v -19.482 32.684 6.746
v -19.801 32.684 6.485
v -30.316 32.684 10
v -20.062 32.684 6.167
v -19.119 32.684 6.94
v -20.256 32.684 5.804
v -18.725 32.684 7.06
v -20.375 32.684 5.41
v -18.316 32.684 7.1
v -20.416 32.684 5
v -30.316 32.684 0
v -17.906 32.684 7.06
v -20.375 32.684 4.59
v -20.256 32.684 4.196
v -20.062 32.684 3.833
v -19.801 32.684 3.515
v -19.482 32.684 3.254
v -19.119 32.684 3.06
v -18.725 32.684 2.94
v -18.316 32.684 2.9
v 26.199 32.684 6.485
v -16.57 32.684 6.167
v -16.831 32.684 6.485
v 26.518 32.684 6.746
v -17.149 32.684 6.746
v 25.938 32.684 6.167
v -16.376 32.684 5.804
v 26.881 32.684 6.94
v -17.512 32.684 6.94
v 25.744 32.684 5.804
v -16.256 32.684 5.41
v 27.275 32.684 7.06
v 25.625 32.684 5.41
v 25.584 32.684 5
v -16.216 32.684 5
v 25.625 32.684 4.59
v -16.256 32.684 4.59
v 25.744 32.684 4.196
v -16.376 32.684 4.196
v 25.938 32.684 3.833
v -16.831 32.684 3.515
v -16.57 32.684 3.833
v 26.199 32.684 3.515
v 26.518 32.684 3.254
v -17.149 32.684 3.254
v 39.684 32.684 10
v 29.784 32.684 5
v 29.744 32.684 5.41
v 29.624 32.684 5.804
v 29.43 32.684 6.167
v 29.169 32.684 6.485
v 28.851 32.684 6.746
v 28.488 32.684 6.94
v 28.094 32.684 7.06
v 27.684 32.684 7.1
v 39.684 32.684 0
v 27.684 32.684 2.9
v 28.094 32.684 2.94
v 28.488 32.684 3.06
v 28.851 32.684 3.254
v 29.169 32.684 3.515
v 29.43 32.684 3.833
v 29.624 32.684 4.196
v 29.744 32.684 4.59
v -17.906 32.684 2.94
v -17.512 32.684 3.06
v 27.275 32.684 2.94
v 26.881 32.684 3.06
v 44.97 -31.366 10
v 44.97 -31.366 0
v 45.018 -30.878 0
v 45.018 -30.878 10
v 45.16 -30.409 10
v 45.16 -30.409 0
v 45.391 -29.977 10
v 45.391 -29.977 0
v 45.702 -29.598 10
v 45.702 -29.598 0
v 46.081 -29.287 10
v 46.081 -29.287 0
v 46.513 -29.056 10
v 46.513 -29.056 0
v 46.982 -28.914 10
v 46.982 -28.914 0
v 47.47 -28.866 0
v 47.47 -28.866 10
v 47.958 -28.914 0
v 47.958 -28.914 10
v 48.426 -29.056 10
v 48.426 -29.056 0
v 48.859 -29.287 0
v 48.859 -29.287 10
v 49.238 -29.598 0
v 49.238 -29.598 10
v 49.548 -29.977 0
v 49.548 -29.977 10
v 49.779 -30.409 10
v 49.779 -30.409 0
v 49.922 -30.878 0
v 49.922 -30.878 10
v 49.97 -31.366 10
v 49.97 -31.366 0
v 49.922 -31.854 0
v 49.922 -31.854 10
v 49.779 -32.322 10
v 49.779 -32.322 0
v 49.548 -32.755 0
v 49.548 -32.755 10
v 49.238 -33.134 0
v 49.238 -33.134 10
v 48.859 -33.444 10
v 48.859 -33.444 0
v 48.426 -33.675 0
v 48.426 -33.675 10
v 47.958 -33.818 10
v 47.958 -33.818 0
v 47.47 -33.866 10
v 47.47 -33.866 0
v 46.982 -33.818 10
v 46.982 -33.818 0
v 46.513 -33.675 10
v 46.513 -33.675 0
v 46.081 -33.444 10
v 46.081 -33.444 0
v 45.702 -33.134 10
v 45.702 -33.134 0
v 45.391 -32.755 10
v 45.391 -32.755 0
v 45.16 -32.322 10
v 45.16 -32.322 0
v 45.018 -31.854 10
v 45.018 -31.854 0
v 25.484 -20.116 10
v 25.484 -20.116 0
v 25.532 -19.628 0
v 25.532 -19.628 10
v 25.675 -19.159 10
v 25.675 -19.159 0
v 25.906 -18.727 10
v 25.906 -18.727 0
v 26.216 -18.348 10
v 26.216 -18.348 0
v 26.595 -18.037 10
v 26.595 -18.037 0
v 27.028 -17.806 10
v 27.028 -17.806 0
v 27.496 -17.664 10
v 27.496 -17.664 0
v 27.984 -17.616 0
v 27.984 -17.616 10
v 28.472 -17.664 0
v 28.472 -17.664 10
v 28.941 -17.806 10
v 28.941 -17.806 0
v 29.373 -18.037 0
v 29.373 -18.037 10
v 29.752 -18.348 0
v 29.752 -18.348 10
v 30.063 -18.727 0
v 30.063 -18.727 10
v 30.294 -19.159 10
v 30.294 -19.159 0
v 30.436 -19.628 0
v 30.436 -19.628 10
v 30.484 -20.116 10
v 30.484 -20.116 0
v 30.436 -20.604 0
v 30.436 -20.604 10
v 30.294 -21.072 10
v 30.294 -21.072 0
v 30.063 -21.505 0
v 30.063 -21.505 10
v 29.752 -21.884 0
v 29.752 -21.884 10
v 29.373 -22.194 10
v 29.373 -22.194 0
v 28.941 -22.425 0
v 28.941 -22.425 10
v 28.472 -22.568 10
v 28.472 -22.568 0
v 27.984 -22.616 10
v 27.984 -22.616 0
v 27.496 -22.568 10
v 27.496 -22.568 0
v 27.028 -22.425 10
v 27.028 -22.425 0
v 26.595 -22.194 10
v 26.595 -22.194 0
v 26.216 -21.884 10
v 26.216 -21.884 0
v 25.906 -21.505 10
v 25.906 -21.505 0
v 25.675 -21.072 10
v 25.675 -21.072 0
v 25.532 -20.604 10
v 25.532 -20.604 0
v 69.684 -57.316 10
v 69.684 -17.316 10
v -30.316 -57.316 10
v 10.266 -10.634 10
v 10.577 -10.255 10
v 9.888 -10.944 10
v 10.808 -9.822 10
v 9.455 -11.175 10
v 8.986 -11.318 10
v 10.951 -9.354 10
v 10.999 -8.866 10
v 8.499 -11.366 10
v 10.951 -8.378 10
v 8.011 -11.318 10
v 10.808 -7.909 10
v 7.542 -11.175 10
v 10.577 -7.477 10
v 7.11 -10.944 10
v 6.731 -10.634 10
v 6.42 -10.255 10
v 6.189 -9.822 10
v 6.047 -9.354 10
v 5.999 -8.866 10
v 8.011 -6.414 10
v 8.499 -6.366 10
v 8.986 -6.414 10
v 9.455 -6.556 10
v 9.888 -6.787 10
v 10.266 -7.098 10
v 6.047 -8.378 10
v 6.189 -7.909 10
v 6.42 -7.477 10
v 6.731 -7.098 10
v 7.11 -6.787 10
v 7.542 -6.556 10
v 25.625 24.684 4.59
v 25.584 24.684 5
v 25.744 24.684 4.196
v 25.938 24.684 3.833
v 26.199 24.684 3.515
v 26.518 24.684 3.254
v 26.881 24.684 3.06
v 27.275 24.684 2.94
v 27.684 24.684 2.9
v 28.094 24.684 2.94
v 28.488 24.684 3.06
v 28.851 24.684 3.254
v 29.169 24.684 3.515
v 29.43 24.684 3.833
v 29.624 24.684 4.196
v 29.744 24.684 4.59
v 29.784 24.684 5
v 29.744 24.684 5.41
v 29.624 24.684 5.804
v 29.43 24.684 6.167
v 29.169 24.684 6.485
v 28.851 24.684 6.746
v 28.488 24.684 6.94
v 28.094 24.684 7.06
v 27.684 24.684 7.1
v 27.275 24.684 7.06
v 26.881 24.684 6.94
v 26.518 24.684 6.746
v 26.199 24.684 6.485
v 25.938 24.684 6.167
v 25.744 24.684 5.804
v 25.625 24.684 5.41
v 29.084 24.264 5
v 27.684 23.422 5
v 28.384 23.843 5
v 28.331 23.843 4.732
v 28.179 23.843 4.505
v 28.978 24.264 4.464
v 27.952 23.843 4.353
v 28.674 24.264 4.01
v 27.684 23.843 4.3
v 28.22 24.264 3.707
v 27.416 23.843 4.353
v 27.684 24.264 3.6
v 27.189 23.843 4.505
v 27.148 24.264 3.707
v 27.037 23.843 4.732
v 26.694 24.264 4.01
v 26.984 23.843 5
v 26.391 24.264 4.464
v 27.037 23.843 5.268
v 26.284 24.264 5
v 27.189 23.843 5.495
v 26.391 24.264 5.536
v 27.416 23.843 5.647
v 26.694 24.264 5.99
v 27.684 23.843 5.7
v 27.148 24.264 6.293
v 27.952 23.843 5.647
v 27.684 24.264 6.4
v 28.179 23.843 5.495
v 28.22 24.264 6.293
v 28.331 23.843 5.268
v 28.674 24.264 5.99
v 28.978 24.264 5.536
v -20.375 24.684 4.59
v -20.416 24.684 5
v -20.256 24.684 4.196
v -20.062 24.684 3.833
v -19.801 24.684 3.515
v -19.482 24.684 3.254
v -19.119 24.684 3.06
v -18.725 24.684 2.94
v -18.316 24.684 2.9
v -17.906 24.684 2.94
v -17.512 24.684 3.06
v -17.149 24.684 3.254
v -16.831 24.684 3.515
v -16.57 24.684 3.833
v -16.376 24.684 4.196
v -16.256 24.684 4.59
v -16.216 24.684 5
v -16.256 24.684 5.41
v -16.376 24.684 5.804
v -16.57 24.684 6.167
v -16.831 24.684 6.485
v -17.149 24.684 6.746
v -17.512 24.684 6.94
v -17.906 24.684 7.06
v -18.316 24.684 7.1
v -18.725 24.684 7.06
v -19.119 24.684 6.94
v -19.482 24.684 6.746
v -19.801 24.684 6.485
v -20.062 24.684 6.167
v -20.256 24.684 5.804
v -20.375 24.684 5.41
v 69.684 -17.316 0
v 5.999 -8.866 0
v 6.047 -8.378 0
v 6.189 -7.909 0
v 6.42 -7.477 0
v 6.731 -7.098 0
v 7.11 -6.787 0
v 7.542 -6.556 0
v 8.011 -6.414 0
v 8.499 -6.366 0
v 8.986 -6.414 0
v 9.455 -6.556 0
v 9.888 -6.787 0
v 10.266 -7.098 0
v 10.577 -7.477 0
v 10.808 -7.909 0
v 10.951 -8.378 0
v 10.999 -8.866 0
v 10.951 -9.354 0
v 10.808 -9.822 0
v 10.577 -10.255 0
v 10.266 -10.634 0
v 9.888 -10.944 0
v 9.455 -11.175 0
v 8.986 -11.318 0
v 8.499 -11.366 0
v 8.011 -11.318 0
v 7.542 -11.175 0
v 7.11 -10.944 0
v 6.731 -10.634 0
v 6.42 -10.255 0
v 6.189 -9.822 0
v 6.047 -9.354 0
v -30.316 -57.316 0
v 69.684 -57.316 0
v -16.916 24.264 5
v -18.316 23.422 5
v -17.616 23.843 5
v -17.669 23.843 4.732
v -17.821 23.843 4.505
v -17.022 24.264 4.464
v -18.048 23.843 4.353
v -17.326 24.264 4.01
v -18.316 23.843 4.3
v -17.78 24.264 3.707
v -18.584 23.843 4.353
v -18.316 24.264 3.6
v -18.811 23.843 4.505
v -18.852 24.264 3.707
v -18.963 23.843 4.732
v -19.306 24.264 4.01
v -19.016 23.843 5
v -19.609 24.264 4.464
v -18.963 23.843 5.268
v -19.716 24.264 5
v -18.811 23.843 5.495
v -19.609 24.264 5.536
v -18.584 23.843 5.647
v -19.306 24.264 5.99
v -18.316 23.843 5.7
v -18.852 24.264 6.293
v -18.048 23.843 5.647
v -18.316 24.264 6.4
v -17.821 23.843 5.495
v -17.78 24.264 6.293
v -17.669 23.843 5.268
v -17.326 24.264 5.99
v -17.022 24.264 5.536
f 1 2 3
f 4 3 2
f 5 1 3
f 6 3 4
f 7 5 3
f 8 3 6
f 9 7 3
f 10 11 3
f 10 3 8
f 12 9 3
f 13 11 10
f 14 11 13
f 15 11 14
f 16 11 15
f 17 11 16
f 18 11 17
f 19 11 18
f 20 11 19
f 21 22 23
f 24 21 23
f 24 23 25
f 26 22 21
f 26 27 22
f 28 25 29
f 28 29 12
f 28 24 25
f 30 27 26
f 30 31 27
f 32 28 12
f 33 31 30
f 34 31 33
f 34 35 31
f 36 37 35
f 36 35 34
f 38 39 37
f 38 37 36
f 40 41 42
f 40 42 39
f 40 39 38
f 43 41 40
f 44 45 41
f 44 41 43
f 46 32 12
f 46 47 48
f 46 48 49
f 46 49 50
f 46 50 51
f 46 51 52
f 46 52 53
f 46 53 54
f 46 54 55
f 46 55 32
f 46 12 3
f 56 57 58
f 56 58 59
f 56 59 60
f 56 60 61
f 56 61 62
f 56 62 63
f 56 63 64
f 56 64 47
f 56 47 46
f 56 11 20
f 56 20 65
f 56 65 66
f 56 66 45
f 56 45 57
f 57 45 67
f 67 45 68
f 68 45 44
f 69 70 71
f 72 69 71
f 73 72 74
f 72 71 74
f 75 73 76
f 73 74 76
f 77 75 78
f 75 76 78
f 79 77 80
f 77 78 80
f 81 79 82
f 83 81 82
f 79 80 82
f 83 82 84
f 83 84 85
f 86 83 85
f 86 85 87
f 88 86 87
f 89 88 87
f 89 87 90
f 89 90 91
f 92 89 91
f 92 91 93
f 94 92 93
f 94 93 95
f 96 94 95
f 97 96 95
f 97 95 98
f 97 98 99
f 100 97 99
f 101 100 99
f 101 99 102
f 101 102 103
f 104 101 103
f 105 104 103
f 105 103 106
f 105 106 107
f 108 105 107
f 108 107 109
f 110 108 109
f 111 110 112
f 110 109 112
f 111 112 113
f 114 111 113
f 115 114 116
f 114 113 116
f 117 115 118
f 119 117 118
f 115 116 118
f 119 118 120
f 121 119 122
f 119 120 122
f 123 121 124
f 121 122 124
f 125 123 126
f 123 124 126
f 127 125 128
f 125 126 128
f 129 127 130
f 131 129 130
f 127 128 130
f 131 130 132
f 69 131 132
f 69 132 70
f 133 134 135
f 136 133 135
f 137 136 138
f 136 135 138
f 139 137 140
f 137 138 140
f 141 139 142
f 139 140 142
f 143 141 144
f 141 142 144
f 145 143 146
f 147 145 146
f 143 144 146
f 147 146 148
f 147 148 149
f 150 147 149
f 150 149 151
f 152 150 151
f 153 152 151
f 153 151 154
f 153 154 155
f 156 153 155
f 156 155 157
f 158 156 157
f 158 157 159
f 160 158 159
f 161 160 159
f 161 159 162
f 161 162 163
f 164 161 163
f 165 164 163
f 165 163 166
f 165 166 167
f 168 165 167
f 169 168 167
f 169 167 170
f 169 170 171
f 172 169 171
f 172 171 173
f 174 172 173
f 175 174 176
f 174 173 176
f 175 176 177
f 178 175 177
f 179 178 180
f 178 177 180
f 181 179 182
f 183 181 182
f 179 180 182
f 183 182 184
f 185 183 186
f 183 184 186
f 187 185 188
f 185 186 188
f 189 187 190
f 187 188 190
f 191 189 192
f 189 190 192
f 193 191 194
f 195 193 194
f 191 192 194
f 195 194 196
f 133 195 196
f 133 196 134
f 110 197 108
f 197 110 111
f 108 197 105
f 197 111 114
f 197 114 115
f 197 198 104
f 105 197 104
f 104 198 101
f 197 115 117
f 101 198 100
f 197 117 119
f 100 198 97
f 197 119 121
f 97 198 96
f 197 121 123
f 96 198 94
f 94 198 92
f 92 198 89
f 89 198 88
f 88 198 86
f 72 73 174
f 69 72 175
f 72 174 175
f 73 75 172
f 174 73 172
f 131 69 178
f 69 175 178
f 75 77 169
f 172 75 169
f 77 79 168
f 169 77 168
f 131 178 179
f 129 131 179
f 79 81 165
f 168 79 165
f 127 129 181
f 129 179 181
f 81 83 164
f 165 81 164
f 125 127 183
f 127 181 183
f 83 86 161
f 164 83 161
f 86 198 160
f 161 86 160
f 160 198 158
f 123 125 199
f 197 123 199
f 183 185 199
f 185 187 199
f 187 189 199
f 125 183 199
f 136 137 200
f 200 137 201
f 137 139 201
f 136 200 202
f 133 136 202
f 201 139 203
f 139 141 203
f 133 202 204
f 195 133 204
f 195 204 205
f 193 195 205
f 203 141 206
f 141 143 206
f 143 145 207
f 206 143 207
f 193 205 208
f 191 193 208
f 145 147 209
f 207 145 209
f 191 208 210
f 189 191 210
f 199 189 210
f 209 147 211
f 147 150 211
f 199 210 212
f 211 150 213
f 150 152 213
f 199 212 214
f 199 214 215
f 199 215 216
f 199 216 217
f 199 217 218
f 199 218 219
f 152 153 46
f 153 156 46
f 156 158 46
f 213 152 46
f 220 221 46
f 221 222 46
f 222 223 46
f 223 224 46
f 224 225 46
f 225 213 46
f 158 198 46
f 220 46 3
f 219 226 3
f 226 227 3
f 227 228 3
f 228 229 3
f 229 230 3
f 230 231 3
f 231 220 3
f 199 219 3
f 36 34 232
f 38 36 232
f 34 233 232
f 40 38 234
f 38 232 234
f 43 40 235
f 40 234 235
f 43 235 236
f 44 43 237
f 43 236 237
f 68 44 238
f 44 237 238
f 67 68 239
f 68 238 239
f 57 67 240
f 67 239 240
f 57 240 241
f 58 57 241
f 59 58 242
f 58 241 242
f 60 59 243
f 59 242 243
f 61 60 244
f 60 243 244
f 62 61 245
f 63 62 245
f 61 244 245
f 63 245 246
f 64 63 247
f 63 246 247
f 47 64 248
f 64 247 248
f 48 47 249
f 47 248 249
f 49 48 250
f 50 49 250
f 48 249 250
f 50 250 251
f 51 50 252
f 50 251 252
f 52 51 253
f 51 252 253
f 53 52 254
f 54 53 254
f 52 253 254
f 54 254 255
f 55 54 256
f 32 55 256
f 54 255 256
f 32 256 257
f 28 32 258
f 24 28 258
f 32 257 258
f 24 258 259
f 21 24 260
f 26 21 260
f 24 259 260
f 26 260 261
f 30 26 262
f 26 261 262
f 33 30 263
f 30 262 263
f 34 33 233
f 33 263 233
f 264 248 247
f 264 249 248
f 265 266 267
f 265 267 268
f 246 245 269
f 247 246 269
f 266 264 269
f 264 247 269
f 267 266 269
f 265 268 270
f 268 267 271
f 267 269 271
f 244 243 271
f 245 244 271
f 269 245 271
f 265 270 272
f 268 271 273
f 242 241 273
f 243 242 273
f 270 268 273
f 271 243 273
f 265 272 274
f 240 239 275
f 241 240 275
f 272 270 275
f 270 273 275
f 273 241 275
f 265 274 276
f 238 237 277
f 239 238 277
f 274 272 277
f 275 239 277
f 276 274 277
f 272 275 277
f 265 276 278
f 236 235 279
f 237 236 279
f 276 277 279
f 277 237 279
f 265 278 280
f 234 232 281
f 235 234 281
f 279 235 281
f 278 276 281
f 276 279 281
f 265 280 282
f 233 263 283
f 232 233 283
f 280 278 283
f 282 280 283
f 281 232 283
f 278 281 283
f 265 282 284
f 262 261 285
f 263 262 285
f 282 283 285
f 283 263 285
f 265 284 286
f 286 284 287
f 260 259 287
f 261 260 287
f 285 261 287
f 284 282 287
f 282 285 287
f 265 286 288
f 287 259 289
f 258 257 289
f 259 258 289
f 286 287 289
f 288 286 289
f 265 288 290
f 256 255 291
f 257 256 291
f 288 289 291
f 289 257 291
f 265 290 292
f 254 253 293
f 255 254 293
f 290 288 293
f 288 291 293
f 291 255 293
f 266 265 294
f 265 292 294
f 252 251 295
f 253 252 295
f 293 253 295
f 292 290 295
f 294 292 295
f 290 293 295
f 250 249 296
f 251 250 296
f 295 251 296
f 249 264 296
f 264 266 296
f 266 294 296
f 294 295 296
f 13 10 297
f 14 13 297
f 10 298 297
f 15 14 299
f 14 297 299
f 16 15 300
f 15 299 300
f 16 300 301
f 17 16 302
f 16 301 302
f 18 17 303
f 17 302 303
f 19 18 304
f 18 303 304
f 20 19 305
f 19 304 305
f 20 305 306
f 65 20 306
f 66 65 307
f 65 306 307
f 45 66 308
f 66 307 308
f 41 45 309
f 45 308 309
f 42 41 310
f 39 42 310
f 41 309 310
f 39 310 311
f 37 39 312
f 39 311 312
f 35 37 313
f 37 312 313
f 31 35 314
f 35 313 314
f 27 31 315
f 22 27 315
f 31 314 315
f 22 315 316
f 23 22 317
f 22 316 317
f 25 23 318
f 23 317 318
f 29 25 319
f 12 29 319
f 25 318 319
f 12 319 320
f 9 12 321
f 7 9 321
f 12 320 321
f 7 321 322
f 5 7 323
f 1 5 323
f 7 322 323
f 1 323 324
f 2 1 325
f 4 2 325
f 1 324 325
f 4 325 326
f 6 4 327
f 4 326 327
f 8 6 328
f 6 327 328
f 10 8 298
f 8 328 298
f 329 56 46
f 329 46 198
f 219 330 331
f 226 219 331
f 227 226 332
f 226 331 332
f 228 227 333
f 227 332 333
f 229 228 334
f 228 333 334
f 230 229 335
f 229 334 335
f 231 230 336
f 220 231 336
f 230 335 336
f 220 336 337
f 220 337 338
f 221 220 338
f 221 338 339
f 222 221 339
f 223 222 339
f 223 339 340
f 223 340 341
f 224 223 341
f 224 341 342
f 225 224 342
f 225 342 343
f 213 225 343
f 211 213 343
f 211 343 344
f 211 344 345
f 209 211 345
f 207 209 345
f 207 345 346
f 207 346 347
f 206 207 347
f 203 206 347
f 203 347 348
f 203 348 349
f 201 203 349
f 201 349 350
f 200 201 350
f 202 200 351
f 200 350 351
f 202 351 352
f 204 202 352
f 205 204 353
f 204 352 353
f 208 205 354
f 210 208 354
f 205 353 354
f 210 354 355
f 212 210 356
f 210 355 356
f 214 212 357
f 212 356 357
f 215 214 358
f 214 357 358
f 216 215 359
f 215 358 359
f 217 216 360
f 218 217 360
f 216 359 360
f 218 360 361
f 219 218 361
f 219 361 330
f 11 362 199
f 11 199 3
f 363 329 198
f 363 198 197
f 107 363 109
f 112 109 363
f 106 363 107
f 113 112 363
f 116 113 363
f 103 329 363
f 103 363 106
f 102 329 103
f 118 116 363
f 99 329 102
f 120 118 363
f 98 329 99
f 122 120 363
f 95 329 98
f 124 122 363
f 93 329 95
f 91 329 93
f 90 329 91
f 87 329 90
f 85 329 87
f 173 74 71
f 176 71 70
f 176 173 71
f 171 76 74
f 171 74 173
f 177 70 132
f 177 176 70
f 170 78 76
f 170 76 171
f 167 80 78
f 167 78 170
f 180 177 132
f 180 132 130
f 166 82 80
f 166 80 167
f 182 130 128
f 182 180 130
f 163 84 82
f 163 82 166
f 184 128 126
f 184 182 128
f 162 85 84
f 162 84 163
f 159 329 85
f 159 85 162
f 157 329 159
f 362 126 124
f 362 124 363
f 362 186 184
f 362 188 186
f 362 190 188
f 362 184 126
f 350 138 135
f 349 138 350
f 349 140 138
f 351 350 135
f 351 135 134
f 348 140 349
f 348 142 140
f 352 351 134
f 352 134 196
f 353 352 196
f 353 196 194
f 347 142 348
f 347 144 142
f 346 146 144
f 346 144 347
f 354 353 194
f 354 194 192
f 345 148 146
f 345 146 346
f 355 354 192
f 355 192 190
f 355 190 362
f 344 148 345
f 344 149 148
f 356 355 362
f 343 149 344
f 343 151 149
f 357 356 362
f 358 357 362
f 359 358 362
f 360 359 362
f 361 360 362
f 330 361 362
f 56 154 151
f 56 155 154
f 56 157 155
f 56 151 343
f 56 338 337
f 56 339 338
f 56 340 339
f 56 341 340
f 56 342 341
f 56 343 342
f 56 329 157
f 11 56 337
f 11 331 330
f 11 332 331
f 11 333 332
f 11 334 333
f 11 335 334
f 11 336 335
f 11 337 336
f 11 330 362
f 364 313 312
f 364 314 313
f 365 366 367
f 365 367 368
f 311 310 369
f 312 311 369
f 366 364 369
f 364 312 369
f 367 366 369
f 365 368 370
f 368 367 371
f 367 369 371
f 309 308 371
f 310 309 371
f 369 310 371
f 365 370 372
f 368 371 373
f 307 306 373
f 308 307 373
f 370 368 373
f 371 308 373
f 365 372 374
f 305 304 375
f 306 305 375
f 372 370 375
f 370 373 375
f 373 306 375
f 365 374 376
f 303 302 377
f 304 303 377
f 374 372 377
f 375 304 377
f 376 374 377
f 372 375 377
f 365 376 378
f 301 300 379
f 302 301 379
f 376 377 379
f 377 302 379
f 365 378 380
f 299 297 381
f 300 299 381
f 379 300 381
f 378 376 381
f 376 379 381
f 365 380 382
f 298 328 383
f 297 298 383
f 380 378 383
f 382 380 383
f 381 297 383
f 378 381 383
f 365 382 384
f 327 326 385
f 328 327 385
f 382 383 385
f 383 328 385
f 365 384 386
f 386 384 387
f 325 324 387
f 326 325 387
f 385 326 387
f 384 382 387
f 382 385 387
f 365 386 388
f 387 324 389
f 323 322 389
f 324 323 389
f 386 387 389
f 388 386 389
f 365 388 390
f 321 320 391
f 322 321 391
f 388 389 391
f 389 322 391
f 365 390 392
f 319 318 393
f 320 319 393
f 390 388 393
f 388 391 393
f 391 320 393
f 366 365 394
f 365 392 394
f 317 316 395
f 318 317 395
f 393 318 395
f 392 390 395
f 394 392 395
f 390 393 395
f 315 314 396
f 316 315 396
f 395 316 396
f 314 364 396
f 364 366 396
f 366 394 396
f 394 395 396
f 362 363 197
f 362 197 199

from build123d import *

# Parameters (mm, degrees)
BOSS_EXTRUDE1_DEPTH   = 10
M6_TAPPED_HOLE1_D     = 5
M6_TAPPED_HOLE1_DEPTH = 15
M6_TAPPED_HOLE1_TIP   = 1.502151548
M5_TAPPED_HOLE1_D     = 4.2
M5_TAPPED_HOLE1_DEPTH = 8
M5_TAPPED_HOLE1_TIP   = 1.2618073


with BuildPart() as part:
    # Sketch2 → Boss-Extrude1 (new body)
    with BuildSketch(Plane.XY):
        Polygon((39.684210526, 32.684210526), (69.684210526, -17.315789474), (69.684210526, -57.315789474), (-30.315789474, -57.315789474), (-30.315789474, 32.684210526), align=None)
    extrude(amount=BOSS_EXTRUDE1_DEPTH)

    # M6 Tapped Hole1
    with Locations(Plane.XY.offset(10)):
        with Locations((8.498638941, -8.865789474), (47.469782111, -31.365789474), (27.984210526, -20.115789474)):
            Hole(M6_TAPPED_HOLE1_D / 2, depth=M6_TAPPED_HOLE1_DEPTH)
            with Locations((0, 0, -(M6_TAPPED_HOLE1_DEPTH + M6_TAPPED_HOLE1_TIP / 2))):  # 118° drill point
                Cone(0, M6_TAPPED_HOLE1_D / 2, M6_TAPPED_HOLE1_TIP, mode=Mode.SUBTRACT)

    # M5 Tapped Hole1
    with Locations(Plane(origin=(0, 32.684210526, 0), x_dir=(1, 0, 0), z_dir=(0, 1, 0))):
        with Locations((-18.315789474, -5), (27.684210526, -5)):
            Hole(M5_TAPPED_HOLE1_D / 2, depth=M5_TAPPED_HOLE1_DEPTH)
            with Locations((0, 0, -(M5_TAPPED_HOLE1_DEPTH + M5_TAPPED_HOLE1_TIP / 2))):  # 118° drill point
                Cone(0, M5_TAPPED_HOLE1_D / 2, M5_TAPPED_HOLE1_TIP, mode=Mode.SUBTRACT)


solid = part.part
